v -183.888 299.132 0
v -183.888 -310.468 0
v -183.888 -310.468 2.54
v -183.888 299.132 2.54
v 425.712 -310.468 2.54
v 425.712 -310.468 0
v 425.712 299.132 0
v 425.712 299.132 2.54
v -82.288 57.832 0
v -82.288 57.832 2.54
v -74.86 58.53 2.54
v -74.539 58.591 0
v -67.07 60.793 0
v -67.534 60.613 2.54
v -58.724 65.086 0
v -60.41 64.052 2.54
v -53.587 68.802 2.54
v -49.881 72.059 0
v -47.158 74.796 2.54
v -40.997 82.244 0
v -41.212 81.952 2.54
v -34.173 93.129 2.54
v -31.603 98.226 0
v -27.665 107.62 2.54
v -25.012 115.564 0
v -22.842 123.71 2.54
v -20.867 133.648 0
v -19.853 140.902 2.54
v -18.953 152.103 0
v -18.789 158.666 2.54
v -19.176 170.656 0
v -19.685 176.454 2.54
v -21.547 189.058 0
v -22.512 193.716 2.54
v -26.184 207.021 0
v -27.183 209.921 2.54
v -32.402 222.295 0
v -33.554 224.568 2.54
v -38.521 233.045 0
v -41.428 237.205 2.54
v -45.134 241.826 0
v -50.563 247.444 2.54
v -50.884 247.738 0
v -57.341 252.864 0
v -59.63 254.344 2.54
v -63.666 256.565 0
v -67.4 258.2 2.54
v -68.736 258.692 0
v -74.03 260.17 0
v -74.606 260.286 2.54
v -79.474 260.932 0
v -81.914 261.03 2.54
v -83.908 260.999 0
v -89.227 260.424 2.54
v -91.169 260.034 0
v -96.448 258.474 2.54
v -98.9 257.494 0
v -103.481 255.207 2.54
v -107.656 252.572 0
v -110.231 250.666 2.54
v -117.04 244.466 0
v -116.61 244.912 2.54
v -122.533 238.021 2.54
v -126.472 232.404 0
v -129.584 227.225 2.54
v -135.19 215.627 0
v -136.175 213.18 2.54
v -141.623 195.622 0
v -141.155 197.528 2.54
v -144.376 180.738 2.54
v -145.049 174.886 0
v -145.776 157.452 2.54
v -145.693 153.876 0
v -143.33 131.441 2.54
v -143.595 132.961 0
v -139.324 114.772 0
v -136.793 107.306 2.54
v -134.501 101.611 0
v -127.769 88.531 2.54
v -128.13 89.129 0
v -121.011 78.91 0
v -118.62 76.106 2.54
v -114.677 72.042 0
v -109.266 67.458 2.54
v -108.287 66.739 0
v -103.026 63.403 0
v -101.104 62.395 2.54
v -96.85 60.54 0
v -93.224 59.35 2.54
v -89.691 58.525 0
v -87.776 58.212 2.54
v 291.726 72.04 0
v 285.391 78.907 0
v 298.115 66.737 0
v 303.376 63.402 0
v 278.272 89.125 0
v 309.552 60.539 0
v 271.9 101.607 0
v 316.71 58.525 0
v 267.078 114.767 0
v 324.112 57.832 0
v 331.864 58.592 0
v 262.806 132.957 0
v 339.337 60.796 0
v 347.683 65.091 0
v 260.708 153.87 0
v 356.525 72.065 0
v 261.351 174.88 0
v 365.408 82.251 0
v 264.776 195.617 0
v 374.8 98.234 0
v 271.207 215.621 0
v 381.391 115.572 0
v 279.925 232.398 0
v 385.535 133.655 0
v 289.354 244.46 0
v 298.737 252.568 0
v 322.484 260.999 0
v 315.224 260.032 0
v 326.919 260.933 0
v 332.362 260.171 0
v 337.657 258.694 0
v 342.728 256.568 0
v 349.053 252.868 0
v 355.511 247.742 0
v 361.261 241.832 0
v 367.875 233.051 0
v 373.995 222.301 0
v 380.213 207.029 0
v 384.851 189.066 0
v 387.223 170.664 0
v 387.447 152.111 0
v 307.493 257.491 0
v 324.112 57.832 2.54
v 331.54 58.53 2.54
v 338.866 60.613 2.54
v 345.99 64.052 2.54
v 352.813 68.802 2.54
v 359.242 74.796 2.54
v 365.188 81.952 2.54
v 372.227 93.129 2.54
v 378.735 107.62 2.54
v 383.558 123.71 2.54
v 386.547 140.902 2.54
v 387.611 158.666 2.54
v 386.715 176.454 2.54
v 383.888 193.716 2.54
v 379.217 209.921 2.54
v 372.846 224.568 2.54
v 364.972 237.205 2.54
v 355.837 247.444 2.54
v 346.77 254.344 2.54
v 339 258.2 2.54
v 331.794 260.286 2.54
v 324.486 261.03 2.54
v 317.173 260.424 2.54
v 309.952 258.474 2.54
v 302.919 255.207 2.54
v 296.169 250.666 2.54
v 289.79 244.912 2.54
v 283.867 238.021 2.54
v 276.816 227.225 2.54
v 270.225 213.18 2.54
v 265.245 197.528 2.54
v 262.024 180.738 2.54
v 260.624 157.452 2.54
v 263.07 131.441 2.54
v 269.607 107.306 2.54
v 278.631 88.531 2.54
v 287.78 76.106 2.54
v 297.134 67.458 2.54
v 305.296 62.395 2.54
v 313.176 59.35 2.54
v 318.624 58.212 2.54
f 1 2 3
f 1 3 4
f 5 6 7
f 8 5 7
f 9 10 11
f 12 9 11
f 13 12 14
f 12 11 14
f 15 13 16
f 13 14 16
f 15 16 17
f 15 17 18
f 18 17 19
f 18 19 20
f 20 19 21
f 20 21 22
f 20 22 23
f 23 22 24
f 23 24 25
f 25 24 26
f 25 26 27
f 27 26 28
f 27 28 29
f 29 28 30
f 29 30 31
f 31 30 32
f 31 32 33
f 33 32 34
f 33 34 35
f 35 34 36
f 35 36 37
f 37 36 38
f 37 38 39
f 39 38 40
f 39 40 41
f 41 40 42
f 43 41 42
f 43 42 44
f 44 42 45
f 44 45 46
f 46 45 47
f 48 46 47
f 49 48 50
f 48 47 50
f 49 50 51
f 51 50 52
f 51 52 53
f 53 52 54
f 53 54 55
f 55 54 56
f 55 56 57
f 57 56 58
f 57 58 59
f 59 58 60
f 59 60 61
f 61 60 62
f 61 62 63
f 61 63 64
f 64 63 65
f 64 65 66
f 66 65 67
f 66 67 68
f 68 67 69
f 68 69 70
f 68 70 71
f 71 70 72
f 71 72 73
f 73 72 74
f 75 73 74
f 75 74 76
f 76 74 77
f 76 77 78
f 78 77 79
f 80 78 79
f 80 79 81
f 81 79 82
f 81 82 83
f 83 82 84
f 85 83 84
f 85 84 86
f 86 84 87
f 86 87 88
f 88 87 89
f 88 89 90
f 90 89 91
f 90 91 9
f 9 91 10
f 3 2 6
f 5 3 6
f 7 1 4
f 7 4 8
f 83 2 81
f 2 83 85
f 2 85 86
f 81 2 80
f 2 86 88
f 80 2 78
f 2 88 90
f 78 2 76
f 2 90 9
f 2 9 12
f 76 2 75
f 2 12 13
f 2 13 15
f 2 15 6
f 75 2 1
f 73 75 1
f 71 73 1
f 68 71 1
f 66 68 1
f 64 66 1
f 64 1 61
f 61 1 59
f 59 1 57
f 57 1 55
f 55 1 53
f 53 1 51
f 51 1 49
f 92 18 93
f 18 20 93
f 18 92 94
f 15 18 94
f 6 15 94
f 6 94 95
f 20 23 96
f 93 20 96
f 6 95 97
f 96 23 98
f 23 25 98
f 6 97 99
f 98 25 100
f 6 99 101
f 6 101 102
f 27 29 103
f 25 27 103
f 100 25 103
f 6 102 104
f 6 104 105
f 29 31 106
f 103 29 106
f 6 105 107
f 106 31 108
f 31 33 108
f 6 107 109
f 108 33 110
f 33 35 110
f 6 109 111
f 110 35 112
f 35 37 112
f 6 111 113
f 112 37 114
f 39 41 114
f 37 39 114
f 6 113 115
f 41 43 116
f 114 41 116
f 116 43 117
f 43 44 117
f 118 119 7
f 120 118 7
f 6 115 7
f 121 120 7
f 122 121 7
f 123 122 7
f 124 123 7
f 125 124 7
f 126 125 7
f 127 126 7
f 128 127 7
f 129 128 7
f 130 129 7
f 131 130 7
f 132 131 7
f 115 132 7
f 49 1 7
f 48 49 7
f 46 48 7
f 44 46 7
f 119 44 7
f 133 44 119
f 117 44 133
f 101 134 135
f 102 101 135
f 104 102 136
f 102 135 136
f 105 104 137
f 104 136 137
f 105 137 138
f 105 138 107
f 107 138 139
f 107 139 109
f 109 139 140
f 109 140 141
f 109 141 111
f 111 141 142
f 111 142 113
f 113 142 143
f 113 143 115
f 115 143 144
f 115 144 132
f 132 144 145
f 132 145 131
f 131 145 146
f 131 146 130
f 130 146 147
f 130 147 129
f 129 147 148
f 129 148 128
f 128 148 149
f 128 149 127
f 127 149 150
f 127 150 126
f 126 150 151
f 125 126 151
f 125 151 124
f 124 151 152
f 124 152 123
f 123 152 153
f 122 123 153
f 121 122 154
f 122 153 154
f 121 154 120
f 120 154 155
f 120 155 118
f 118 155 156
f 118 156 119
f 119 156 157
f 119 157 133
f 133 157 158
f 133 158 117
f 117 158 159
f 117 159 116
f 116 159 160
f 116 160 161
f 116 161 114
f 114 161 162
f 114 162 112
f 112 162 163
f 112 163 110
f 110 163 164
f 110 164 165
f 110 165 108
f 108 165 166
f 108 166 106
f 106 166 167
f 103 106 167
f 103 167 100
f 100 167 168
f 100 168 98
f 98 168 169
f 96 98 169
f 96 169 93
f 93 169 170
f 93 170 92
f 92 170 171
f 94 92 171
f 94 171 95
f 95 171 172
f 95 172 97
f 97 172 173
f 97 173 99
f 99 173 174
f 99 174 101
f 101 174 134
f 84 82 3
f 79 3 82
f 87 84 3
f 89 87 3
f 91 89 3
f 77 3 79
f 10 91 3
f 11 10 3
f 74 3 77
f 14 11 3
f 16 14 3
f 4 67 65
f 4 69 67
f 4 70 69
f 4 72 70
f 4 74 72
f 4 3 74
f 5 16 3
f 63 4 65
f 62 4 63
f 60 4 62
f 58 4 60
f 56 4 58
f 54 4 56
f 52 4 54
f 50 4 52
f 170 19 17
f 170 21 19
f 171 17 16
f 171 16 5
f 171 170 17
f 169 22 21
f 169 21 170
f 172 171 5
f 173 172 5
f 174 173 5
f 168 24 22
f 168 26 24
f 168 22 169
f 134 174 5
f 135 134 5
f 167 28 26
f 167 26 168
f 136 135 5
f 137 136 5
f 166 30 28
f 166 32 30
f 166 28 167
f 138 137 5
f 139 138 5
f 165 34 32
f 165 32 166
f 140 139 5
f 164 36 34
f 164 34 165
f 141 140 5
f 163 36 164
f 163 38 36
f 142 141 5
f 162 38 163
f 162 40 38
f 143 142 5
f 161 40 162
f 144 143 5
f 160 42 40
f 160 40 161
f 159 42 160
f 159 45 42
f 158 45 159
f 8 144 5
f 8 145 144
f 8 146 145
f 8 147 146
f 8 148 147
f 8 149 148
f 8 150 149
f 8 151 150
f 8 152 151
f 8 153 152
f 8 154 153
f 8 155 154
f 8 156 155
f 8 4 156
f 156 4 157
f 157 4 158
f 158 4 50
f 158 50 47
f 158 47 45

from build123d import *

# Parameters (mm, degrees)
SKETCH1_W           = 609.6
SKETCH1_H           = 609.6
BOSS_EXTRUDE1_DEPTH = 2.54
SKETCH2_RX          = 101.6
SKETCH2_RY          = 63.5
CUT_EXTRUDE1_DEPTH  = 3.54


with BuildPart() as part:
    # Sketch1 → Boss-Extrude1 (new body)
    with BuildSketch(Plane.XY):
        with Locations((120.912396694, -5.667768595)):
            Rectangle(SKETCH1_W, SKETCH1_H)
    extrude(amount=BOSS_EXTRUDE1_DEPTH)

    # Sketch2 → Cut-Extrude1 (cut, through all)
    with BuildSketch(Plane.XY.offset(2.54)):
        with Locations(Location((-82.287603306, 159.432231405), (0, 0, -90))):
            Ellipse(SKETCH2_RX, SKETCH2_RY)
        with Locations(Location((324.112396694, 159.432231405), (0, 0, -90))):
            Ellipse(SKETCH2_RX, SKETCH2_RY)
    extrude(amount=-CUT_EXTRUDE1_DEPTH, mode=Mode.SUBTRACT)


solid = part.part
